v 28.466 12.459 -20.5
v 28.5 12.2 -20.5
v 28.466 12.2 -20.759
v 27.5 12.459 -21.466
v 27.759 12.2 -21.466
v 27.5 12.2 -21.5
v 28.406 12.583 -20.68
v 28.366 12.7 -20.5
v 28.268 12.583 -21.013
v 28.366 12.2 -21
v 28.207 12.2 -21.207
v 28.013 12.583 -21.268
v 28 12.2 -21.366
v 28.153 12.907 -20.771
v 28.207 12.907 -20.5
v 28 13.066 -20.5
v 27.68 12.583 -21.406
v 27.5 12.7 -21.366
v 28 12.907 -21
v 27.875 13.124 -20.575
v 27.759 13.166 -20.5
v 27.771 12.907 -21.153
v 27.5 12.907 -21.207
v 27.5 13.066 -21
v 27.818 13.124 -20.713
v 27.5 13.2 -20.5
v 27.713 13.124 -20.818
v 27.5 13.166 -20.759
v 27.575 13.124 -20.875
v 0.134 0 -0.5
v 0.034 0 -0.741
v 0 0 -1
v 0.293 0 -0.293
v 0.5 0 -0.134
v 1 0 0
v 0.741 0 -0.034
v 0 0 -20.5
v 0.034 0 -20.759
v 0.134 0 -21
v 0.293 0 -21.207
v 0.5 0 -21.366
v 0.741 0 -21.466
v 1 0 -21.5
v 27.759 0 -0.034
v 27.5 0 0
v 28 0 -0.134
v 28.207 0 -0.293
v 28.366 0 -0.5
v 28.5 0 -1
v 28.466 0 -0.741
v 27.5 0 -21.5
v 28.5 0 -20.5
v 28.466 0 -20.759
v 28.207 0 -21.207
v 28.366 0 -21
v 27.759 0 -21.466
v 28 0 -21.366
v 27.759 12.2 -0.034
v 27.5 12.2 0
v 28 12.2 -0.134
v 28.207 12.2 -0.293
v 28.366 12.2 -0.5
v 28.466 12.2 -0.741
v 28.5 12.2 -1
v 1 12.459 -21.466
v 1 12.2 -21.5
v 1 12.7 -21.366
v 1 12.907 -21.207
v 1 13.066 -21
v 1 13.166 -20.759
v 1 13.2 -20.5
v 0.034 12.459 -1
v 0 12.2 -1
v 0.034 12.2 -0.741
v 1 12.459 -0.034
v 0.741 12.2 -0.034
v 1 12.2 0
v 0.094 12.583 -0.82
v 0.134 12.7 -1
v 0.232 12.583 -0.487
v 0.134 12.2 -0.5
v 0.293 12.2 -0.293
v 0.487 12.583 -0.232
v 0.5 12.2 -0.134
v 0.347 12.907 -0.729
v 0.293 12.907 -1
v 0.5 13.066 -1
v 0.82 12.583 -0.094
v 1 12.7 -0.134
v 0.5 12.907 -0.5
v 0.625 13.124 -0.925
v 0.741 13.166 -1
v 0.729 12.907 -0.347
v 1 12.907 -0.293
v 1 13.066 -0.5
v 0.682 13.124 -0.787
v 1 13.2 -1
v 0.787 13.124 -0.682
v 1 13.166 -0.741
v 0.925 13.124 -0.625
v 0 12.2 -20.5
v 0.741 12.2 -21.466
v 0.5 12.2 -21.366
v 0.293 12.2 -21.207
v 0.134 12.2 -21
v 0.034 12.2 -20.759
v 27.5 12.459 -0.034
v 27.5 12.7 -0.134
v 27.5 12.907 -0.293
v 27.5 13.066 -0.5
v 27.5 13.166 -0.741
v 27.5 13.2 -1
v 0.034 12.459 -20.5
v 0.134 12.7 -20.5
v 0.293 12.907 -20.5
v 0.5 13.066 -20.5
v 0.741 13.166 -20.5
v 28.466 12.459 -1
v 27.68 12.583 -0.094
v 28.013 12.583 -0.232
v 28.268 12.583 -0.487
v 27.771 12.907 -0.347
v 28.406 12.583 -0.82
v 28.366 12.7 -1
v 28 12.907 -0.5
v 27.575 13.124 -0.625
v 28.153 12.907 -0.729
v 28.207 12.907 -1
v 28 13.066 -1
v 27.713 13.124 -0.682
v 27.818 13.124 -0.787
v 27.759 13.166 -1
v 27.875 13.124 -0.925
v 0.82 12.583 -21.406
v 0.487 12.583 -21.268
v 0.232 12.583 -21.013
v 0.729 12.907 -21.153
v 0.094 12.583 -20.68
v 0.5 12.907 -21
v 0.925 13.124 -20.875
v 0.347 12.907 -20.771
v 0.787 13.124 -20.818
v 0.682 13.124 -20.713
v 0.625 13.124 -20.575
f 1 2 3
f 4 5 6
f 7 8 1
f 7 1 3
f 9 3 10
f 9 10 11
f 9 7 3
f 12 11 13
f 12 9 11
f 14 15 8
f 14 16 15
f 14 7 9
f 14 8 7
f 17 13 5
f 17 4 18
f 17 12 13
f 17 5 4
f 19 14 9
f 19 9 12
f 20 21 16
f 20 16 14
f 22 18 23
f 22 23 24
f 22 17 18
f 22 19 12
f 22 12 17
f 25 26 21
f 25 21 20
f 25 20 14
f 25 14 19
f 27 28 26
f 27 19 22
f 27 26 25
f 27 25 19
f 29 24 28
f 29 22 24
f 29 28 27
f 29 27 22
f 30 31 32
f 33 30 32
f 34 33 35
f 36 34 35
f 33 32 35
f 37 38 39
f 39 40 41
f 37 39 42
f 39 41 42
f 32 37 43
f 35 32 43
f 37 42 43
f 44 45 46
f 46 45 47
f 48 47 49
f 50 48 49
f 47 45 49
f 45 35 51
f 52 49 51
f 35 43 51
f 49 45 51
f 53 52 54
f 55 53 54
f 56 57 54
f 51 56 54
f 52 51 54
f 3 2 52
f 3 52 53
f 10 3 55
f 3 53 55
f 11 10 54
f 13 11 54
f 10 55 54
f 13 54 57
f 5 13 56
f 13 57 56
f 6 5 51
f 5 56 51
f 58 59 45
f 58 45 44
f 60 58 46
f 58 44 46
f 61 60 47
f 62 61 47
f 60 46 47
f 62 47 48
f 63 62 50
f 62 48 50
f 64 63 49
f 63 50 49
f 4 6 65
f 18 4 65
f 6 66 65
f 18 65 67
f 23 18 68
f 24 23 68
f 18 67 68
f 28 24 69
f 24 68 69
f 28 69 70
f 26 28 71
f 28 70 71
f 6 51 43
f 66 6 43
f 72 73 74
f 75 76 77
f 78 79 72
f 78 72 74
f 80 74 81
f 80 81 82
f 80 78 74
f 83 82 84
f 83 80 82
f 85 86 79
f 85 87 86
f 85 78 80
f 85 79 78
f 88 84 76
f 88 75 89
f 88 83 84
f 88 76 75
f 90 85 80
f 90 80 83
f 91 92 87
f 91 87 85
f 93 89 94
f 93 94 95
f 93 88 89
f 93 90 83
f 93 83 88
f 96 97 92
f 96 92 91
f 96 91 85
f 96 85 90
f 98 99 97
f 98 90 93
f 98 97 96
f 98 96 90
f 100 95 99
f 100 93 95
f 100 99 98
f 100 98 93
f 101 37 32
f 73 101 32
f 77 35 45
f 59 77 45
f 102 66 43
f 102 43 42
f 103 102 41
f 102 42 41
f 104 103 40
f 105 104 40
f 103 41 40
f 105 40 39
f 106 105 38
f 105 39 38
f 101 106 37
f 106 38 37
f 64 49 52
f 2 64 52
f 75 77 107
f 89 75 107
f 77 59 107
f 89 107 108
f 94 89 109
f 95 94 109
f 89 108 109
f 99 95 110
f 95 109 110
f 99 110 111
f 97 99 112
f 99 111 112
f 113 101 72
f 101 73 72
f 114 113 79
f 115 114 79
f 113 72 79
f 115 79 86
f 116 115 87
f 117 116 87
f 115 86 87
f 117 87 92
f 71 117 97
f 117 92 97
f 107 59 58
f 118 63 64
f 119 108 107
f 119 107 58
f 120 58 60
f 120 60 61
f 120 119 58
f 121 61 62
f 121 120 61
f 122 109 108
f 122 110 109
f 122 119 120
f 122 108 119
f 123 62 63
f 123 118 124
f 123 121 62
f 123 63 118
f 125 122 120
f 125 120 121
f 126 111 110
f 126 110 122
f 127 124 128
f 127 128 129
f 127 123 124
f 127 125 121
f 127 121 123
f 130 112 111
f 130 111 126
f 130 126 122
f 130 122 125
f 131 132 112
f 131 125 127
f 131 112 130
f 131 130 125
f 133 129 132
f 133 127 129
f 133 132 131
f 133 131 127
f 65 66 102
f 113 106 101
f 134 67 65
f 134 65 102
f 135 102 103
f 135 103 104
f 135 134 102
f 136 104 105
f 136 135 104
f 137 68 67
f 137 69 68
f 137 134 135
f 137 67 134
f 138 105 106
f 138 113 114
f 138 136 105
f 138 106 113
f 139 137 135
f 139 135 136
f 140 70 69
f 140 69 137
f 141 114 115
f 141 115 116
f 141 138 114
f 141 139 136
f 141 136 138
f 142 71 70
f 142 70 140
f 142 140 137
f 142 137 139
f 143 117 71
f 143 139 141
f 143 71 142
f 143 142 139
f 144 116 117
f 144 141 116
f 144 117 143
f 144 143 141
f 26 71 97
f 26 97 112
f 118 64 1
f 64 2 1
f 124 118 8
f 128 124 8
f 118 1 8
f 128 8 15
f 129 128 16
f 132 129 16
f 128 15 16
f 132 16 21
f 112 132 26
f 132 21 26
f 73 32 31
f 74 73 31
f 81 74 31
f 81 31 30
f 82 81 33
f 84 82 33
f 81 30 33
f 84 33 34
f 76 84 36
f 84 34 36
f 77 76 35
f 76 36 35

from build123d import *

# Parameters (mm, degrees)
EXTRUDE_1_DEPTH = 13.2
FILLET_1_R      = 1


with BuildPart() as part:
    # 草图1 → 凸台-拉伸1 (new body)
    with BuildSketch(Plane(origin=(0, 0, 0), x_dir=(1, 0, 0), z_dir=(0, 1, 0))):
        with BuildLine():
            Line((1, 0), (27.5, 0))
            ThreePointArc((27.5, 0), (28.207106781, 0.292893219), (28.5, 1))
            Line((28.5, 1), (28.5, 20.5))
            ThreePointArc((28.5, 20.5), (28.207106781, 21.207106781), (27.5, 21.5))
            Line((27.5, 21.5), (1, 21.5))
            ThreePointArc((1, 21.5), (0.292893219, 21.207106781), (0, 20.5))
            Line((0, 20.5), (0, 1))
            ThreePointArc((0, 1), (0.292893219, 0.292893219), (1, 0))
        make_face()
    extrude(amount=EXTRUDE_1_DEPTH)

    # 圆角1
    fillet_1_edges = [part.edges().sort_by_distance(p)[0] for p in [
        (28.207106781, 13.2, -0.292893219),
        (28.5, 13.2, -10.75),
        (28.207106781, 13.2, -21.207106781),
        (14.25, 13.2, -21.5),
        (0.292893219, 13.2, -21.207106781),
        (0, 13.2, -10.75),
        (0.292893219, 13.2, -0.292893219),
        (14.25, 13.2, 0),
    ]]
    fillet(fillet_1_edges, radius=FILLET_1_R)


solid = part.part
